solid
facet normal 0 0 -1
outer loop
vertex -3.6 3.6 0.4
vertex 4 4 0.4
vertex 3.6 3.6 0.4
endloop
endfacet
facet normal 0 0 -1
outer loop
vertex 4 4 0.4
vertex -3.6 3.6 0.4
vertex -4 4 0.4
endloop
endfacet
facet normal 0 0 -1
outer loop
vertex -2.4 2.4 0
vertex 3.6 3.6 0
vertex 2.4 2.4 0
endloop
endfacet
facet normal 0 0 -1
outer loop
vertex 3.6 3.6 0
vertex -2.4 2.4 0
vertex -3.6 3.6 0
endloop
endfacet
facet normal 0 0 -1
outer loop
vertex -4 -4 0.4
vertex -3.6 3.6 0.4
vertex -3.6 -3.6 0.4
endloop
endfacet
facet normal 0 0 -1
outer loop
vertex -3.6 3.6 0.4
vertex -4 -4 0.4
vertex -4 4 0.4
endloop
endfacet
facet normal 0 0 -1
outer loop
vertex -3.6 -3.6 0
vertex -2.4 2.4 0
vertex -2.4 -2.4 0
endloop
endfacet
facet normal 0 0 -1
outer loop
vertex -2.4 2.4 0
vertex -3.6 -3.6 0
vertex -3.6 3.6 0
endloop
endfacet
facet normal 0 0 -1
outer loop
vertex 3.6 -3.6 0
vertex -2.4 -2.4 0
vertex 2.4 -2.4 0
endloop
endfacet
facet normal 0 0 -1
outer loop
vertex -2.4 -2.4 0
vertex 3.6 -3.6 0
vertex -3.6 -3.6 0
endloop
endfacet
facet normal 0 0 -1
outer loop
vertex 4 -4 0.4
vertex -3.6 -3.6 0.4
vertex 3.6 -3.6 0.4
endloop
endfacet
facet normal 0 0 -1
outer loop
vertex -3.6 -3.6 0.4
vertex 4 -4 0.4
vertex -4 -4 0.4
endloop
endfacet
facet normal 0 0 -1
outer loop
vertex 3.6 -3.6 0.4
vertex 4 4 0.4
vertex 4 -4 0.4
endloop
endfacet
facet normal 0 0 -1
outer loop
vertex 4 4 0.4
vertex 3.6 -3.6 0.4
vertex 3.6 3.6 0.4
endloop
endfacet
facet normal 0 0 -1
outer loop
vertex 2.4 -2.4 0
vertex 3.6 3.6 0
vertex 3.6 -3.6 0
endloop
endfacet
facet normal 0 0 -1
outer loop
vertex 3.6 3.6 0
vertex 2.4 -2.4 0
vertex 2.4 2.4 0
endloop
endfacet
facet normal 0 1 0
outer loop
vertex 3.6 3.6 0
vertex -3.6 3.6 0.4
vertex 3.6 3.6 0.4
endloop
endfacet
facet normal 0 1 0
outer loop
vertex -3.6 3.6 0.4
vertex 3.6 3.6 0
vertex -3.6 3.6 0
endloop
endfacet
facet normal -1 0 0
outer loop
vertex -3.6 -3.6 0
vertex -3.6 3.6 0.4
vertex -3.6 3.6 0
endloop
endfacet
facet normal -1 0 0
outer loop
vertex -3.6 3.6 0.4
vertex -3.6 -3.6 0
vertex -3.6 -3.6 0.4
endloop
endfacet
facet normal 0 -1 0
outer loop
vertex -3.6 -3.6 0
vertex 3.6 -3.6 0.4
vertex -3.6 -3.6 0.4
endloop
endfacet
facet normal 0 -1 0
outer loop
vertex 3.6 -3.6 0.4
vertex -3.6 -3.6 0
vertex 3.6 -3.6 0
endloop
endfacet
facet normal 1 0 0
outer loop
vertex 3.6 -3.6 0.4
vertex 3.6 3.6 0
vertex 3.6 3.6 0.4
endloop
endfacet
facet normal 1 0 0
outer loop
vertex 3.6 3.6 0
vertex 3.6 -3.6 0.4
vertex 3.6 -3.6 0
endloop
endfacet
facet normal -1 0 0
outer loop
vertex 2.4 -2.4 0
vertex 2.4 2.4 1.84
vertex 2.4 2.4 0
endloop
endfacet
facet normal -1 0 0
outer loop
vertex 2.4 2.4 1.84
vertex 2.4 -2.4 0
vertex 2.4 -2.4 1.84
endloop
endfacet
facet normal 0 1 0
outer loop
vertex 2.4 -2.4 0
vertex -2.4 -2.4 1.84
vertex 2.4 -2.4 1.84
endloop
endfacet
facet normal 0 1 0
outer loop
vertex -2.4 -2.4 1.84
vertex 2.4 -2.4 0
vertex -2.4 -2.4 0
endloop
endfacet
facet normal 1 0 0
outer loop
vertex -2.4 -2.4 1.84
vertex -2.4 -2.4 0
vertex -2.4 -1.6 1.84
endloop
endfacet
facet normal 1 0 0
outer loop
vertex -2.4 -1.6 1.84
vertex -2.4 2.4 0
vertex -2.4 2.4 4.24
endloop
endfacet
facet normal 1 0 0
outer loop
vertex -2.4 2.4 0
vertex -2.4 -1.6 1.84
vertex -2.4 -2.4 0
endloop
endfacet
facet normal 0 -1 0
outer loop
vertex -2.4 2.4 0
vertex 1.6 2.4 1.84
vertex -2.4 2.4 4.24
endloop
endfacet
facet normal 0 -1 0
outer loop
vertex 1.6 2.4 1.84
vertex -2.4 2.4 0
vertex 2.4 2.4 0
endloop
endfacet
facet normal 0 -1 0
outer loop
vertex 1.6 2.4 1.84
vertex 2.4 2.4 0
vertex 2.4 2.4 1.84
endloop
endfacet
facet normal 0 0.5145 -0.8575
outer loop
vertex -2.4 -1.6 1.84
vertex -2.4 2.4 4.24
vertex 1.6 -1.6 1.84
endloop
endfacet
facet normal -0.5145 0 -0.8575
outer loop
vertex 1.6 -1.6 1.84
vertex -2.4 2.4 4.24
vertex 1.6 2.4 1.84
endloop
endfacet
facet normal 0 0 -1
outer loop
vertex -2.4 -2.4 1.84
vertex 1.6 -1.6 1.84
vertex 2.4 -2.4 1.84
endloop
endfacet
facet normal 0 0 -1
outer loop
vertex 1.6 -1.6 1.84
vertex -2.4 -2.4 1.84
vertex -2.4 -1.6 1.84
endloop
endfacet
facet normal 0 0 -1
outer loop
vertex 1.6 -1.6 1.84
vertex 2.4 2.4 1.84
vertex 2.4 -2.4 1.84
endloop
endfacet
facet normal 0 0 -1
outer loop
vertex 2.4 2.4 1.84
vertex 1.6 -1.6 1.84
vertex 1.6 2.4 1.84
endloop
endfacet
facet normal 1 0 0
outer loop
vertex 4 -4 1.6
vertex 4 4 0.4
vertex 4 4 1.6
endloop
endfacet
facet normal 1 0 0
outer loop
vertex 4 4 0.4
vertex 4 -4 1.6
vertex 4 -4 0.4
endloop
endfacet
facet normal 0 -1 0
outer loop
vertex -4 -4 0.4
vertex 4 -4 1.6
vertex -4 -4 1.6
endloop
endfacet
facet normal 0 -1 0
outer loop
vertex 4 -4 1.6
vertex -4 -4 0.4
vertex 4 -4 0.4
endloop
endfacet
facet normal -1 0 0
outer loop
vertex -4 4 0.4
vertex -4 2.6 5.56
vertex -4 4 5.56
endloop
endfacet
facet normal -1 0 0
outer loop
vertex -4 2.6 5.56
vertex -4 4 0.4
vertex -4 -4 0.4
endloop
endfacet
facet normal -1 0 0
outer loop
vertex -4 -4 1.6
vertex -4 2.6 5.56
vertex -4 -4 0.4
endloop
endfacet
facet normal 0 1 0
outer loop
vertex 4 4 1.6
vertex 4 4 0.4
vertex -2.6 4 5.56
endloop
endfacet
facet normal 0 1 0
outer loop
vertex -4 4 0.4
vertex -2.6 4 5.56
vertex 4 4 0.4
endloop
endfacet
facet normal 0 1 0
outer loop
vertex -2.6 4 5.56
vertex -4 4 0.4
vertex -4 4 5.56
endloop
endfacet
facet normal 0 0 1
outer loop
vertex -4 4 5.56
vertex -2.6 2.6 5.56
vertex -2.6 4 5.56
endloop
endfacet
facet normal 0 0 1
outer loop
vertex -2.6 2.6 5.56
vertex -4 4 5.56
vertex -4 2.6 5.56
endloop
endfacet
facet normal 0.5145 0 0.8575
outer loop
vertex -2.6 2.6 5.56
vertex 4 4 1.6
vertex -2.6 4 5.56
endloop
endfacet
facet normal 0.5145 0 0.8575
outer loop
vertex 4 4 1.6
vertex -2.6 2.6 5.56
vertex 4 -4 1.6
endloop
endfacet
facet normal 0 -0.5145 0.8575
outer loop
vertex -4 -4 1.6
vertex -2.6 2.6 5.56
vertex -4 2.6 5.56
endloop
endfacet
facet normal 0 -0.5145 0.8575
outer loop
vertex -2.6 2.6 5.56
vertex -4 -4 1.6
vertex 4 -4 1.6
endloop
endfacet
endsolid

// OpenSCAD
// file: ../p/rect.scad
use <../lib.scad>
function ldraw_lib__rect() = [
// 0 Rectangle
// 0 Name: rect.dat
// 0 Author: James Jessiman
// 0 !LDRAW_ORG Primitive UPDATE 2010-01
// 0 !LICENSE Licensed under CC BY 4.0 : see CAreadme.txt
// 
// 0 BFC CERTIFY CCW
  [0,"BFC","CERTIFY"],
  [0,"BFC","CCW"],
// 
// 0 !HISTORY 2002-04-05 [hafhead] Added BFC statement
// 0 !HISTORY 2002-04-25 [PTadmin] Official Update 2002-02
// 0 !HISTORY 2007-06-24 [PTadmin] Header formatted for Contributor Agreement
// 0 !HISTORY 2008-07-01 [PTadmin] Official Update 2008-01
// 0 !HISTORY 2010-01-17 [mikeheide] changed winding to CCW
// 0 !HISTORY 2010-04-05 [PTadmin] Official Update 2010-01
// 
// 
// 2 24 1 0 1 -1 0 1
  [2,24,1,0,1,-1,0,1],
// 2 24 -1 0 1 -1 0 -1
  [2,24,-1,0,1,-1,0,-1],
// 2 24 -1 0 -1 1 0 -1
  [2,24,-1,0,-1,1,0,-1],
// 2 24 1 0 -1 1 0 1
  [2,24,1,0,-1,1,0,1],
// 4 16 -1 0 1 -1 0 -1 1 0 -1 1 0 1
  [4,16,-1,0,1,-1,0,-1,1,0,-1,1,0,1],
// 0
];
module ldraw_lib__rect(step=0, col=false, unit=2/5, alt=false, line=0.2, solid=!$preview)
    makepoly(ldraw_lib__rect(), step=step, col=col, unit=unit, alt=alt, line=line, solid=solid);
ldraw_lib__rect(line=0.2);
// file: ../p/box4.scad
use <../lib.scad>
function ldraw_lib__box4() = [
// 0 Box with 4 Faces (2 Parallel Pairs) and All Edges
// 0 Name: box4.dat
// 0 Author: James Jessiman
// 0 !LDRAW_ORG Primitive UPDATE 2012-01
// 0 !LICENSE Licensed under CC BY 4.0 : see CAreadme.txt
// 
// 0 BFC CERTIFY CCW
  [0,"BFC","CERTIFY"],
  [0,"BFC","CCW"],
// 
// 0 !HISTORY 2002-04-03 [sbliss] Modified for BFC compliance
// 0 !HISTORY 2002-04-25 [PTadmin] Official Update 2002-02
// 0 !HISTORY 2007-06-24 [PTadmin] Header formatted for Contributor Agreement
// 0 !HISTORY 2008-07-01 [PTadmin] Official Update 2008-01
// 0 !HISTORY 2012-02-16 [Philo] Changed to CCW
// 0 !HISTORY 2012-03-30 [PTadmin] Official Update 2012-01
// 
// 
// 2 24 1 1 1 -1 1 1
  [2,24,1,1,1,-1,1,1],
// 2 24 -1 1 1 -1 1 -1
  [2,24,-1,1,1,-1,1,-1],
// 2 24 -1 1 -1 1 1 -1
  [2,24,-1,1,-1,1,1,-1],
// 2 24 1 1 -1 1 1 1
  [2,24,1,1,-1,1,1,1],
// 2 24 1 0 1 -1 0 1
  [2,24,1,0,1,-1,0,1],
// 2 24 -1 0 1 -1 0 -1
  [2,24,-1,0,1,-1,0,-1],
// 2 24 -1 0 -1 1 0 -1
  [2,24,-1,0,-1,1,0,-1],
// 2 24 1 0 -1 1 0 1
  [2,24,1,0,-1,1,0,1],
// 2 24 1 0 1 1 1 1
  [2,24,1,0,1,1,1,1],
// 2 24 -1 0 1 -1 1 1
  [2,24,-1,0,1,-1,1,1],
// 2 24 1 0 -1 1 1 -1
  [2,24,1,0,-1,1,1,-1],
// 2 24 -1 0 -1 -1 1 -1
  [2,24,-1,0,-1,-1,1,-1],
// 4 16 -1 1 1 -1 0 1 1 0 1 1 1 1
  [4,16,-1,1,1,-1,0,1,1,0,1,1,1,1],
// 4 16 -1 1 -1 -1 0 -1 -1 0 1 -1 1 1
  [4,16,-1,1,-1,-1,0,-1,-1,0,1,-1,1,1],
// 4 16 1 1 -1 1 0 -1 -1 0 -1 -1 1 -1
  [4,16,1,1,-1,1,0,-1,-1,0,-1,-1,1,-1],
// 4 16 1 1 1 1 0 1 1 0 -1 1 1 -1
  [4,16,1,1,1,1,0,1,1,0,-1,1,1,-1],
];
module ldraw_lib__box4(step=0, col=false, unit=2/5, alt=false, line=0.2, solid=!$preview)
    makepoly(ldraw_lib__box4(), step=step, col=col, unit=unit, alt=alt, line=line, solid=solid);
ldraw_lib__box4(line=0.2);
// file: ../p/box2-5.scad
use <../lib.scad>
function ldraw_lib__box2_5() = [
// 0 Box with 2 Faces without 5 Edges
// 0 Name: box2-5.dat
// 0 Author: Steffen [Steffen]
// 0 !LDRAW_ORG Primitive UPDATE 2003-03
// 0 !LICENSE Licensed under CC BY 4.0 : see CAreadme.txt
// 
// 0 BFC CERTIFY CCW
  [0,"BFC","CERTIFY"],
  [0,"BFC","CCW"],
// 
// 0 !HISTORY 2003-12-19 [PTadmin] Official Update 2003-03
// 0 !HISTORY 2007-06-24 [PTadmin] Header formatted for Contributor Agreement
// 0 !HISTORY 2008-07-01 [PTadmin] Official Update 2008-01
// 
// 
// 2 24 1 1 1 -1 1 1
  [2,24,1,1,1,-1,1,1],
// 2 24 1 1 -1 -1 1 -1
  [2,24,1,1,-1,-1,1,-1],
// 2 24 1 -1 1 -1 -1 1
  [2,24,1,-1,1,-1,-1,1],
// 2 24 -1 -1 1 -1 1 1
  [2,24,-1,-1,1,-1,1,1],
// 2 24 1 -1 1 1 1 1
  [2,24,1,-1,1,1,1,1],
// 2 24 -1 1 -1 -1 1 1
  [2,24,-1,1,-1,-1,1,1],
// 2 24 1 1 -1 1 1 1
  [2,24,1,1,-1,1,1,1],
// 4 16 1 1 1 1 1 -1 -1 1 -1 -1 1 1
  [4,16,1,1,1,1,1,-1,-1,1,-1,-1,1,1],
// 4 16 1 1 1 -1 1 1 -1 -1 1 1 -1 1
  [4,16,1,1,1,-1,1,1,-1,-1,1,1,-1,1],
// 0
];
module ldraw_lib__box2_5(step=0, col=false, unit=2/5, alt=false, line=0.2, solid=!$preview)
    makepoly(ldraw_lib__box2_5(), step=step, col=col, unit=unit, alt=alt, line=line, solid=solid);
ldraw_lib__box2_5(line=0.2);
// main file
use <../lib.scad>
use <../p/box2-5.scad>
use <../p/box4.scad>
use <../p/rect.scad>
function ldraw_lib__7826() = [
// 0 Slope Brick 31  1 x  1 x  0.667 Double Convex
// 0 Name: 7826.dat
// 0 Author: Gerald Lasser [GeraldLasser]
// 0 !LDRAW_ORG Part UPDATE 2026-01
// 0 !LICENSE Licensed under CC BY 4.0 : see CAreadme.txt
// 
// 0 BFC CERTIFY CCW
  [0,"BFC","CERTIFY"],
  [0,"BFC","CCW"],
// 
// 0 !KEYWORDS Brickowl 1405542
// 
// 0 !HISTORY 2026-01-29 [OrionP] Official Update 2026-01
// 
// 0 // Inside and Bottom
// 4 16 -9 -1 9 -10 -1 10 10 -1 10 9 -1 9
  [4,16,-9,-1,9,-10,-1,10,10,-1,10,9,-1,9],
// 4 16 9 0 9 6 0 6 -6 0 6 -9 0 9
  [4,16,9,0,9,6,0,6,-6,0,6,-9,0,9],
// 4 16 -10 -1 -10 -10 -1 10 -9 -1 9 -9 -1 -9
  [4,16,-10,-1,-10,-10,-1,10,-9,-1,9,-9,-1,-9],
// 4 16 -6 0 6 -6 0 -6 -9 0 -9 -9 0 9
  [4,16,-6,0,6,-6,0,-6,-9,0,-9,-9,0,9],
// 4 16 -6 0 -6 6 0 -6 9 0 -9 -9 0 -9
  [4,16,-6,0,-6,6,0,-6,9,0,-9,-9,0,-9],
// 4 16 10 -1 -10 -10 -1 -10 -9 -1 -9 9 -1 -9
  [4,16,10,-1,-10,-10,-1,-10,-9,-1,-9,9,-1,-9],
// 4 16 9 -1 9 10 -1 10 10 -1 -10 9 -1 -9
  [4,16,9,-1,9,10,-1,10,10,-1,-10,9,-1,-9],
// 4 16 9 0 -9 6 0 -6 6 0 6 9 0 9
  [4,16,9,0,-9,6,0,-6,6,0,6,9,0,9],
// 1 16 0 -1 0 9 0 0 0 1 0 0 0 9 box4.dat
  [1,16,0,-1,0,9,0,0,0,1,0,0,0,9, ldraw_lib__box4()],
// 
// 0 BFC INVERTNEXT
  [0,"BFC","INVERTNEXT"],
// 1 16 0 -2.3 0 0 6 0 2.3 0 0 0 0 -6 box2-5.dat
  [1,16,0,-2.3,0,0,6,0,2.3,0,0,0,0,-6, ldraw_lib__box2_5()],
// 3 16 -6 -4.6 -6 -6 0 -6 -6 -4.6 -4
  [3,16,-6,-4.6,-6,-6,0,-6,-6,-4.6,-4],
// 4 16 -6 -10.6 6 -6 -4.6 -4 -6 0 -6 -6 0 6
  [4,16,-6,-10.6,6,-6,-4.6,-4,-6,0,-6,-6,0,6],
// 4 16 6 0 6 4 -4.6 6 -6 -10.6 6 -6 0 6
  [4,16,6,0,6,4,-4.6,6,-6,-10.6,6,-6,0,6],
// 3 16 4 -4.6 6 6 0 6 6 -4.6 6
  [3,16,4,-4.6,6,6,0,6,6,-4.6,6],
// 2 24 -6 0 6 6 0 6
  [2,24,-6,0,6,6,0,6],
// 2 24 -6 0 6 -6 0 -6
  [2,24,-6,0,6,-6,0,-6],
// 2 24 -6 -10.6 6 -6 0 6
  [2,24,-6,-10.6,6,-6,0,6],
// 2 24 -6 -4.6 -4 -6 -10.6 6
  [2,24,-6,-4.6,-4,-6,-10.6,6],
// 2 24 -6 -4.6 -4 -6 -4.6 -6
  [2,24,-6,-4.6,-4,-6,-4.6,-6],
// 2 24 6 -4.6 6 4 -4.6 6
  [2,24,6,-4.6,6,4,-4.6,6],
// 2 24 4 -4.6 6 -6 -10.6 6
  [2,24,4,-4.6,6,-6,-10.6,6],
// 2 24 4 -4.6 -4 4 -4.6 6
  [2,24,4,-4.6,-4,4,-4.6,6],
// 2 24 -6 -4.6 -4 4 -4.6 -4
  [2,24,-6,-4.6,-4,4,-4.6,-4],
// 2 24 4 -4.6 -4 -6 -10.6 6
  [2,24,4,-4.6,-4,-6,-10.6,6],
// 3 16 -6 -4.6 -4 -6 -10.6 6 4 -4.6 -4
  [3,16,-6,-4.6,-4,-6,-10.6,6,4,-4.6,-4],
// 3 16 4 -4.6 -4 -6 -10.6 6 4 -4.6 6
  [3,16,4,-4.6,-4,-6,-10.6,6,4,-4.6,6],
// 4 16 6 -4.6 -6 -6 -4.6 -6 -6 -4.6 -4 4 -4.6 -4
  [4,16,6,-4.6,-6,-6,-4.6,-6,-6,-4.6,-4,4,-4.6,-4],
// 4 16 6 -4.6 6 6 -4.6 -6 4 -4.6 -4 4 -4.6 6
  [4,16,6,-4.6,6,6,-4.6,-6,4,-4.6,-4,4,-4.6,6],
// 
// 0 // Outside
// 1 16 0 -2.5 0 0 10 0 1.5 0 0 0 0 -10 box2-5.dat
  [1,16,0,-2.5,0,0,10,0,1.5,0,0,0,0,-10, ldraw_lib__box2_5()],
// 4 16 -10 -13.9 6.5 -10 -13.9 10 -10 -1 10 -10 -1 -10
  [4,16,-10,-13.9,6.5,-10,-13.9,10,-10,-1,10,-10,-1,-10],
// 3 16 -10 -4 -10 -10 -13.9 6.5 -10 -1 -10
  [3,16,-10,-4,-10,-10,-13.9,6.5,-10,-1,-10],
// 3 16 10 -4 10 10 -1 10 -6.5 -13.9 10
  [3,16,10,-4,10,10,-1,10,-6.5,-13.9,10],
// 4 16 -10 -1 10 -10 -13.9 10 -6.5 -13.9 10 10 -1 10
  [4,16,-10,-1,10,-10,-13.9,10,-6.5,-13.9,10,10,-1,10],
// 2 24 -10 -1 10 -10 -1 -10
  [2,24,-10,-1,10,-10,-1,-10],
// 2 24 -10 -1 10 10 -1 10
  [2,24,-10,-1,10,10,-1,10],
// 2 24 -10 -13.9 10 -10 -1 10
  [2,24,-10,-13.9,10,-10,-1,10],
// 2 24 10 -4 10 -6.5 -13.9 10
  [2,24,10,-4,10,-6.5,-13.9,10],
// 2 24 -6.5 -13.9 6.5 10 -4 -10
  [2,24,-6.5,-13.9,6.5,10,-4,-10],
// 2 24 -10 -4 -10 -10 -13.9 6.5
  [2,24,-10,-4,-10,-10,-13.9,6.5],
// 1 16 -8.25 -13.9 8.25 0 0 -1.75 0 1 0 1.75 0 0 rect.dat
  [1,16,-8.25,-13.9,8.25,0,0,-1.75,0,1,0,1.75,0,0, ldraw_lib__rect()],
// 4 16 10 -4 -10 10 -4 10 -6.5 -13.9 10 -6.5 -13.9 6.5
  [4,16,10,-4,-10,10,-4,10,-6.5,-13.9,10,-6.5,-13.9,6.5],
// 4 16 -6.5 -13.9 6.5 -10 -13.9 6.5 -10 -4 -10 10 -4 -10
  [4,16,-6.5,-13.9,6.5,-10,-13.9,6.5,-10,-4,-10,10,-4,-10],
];
module ldraw_lib__7826(step=0, col=false, unit=2/5, alt=false, line=0.2, solid=!$preview)
    makepoly(ldraw_lib__7826(), step=step, col=col, unit=unit, alt=alt, line=line, solid=solid);
ldraw_lib__7826(line=0.2);
